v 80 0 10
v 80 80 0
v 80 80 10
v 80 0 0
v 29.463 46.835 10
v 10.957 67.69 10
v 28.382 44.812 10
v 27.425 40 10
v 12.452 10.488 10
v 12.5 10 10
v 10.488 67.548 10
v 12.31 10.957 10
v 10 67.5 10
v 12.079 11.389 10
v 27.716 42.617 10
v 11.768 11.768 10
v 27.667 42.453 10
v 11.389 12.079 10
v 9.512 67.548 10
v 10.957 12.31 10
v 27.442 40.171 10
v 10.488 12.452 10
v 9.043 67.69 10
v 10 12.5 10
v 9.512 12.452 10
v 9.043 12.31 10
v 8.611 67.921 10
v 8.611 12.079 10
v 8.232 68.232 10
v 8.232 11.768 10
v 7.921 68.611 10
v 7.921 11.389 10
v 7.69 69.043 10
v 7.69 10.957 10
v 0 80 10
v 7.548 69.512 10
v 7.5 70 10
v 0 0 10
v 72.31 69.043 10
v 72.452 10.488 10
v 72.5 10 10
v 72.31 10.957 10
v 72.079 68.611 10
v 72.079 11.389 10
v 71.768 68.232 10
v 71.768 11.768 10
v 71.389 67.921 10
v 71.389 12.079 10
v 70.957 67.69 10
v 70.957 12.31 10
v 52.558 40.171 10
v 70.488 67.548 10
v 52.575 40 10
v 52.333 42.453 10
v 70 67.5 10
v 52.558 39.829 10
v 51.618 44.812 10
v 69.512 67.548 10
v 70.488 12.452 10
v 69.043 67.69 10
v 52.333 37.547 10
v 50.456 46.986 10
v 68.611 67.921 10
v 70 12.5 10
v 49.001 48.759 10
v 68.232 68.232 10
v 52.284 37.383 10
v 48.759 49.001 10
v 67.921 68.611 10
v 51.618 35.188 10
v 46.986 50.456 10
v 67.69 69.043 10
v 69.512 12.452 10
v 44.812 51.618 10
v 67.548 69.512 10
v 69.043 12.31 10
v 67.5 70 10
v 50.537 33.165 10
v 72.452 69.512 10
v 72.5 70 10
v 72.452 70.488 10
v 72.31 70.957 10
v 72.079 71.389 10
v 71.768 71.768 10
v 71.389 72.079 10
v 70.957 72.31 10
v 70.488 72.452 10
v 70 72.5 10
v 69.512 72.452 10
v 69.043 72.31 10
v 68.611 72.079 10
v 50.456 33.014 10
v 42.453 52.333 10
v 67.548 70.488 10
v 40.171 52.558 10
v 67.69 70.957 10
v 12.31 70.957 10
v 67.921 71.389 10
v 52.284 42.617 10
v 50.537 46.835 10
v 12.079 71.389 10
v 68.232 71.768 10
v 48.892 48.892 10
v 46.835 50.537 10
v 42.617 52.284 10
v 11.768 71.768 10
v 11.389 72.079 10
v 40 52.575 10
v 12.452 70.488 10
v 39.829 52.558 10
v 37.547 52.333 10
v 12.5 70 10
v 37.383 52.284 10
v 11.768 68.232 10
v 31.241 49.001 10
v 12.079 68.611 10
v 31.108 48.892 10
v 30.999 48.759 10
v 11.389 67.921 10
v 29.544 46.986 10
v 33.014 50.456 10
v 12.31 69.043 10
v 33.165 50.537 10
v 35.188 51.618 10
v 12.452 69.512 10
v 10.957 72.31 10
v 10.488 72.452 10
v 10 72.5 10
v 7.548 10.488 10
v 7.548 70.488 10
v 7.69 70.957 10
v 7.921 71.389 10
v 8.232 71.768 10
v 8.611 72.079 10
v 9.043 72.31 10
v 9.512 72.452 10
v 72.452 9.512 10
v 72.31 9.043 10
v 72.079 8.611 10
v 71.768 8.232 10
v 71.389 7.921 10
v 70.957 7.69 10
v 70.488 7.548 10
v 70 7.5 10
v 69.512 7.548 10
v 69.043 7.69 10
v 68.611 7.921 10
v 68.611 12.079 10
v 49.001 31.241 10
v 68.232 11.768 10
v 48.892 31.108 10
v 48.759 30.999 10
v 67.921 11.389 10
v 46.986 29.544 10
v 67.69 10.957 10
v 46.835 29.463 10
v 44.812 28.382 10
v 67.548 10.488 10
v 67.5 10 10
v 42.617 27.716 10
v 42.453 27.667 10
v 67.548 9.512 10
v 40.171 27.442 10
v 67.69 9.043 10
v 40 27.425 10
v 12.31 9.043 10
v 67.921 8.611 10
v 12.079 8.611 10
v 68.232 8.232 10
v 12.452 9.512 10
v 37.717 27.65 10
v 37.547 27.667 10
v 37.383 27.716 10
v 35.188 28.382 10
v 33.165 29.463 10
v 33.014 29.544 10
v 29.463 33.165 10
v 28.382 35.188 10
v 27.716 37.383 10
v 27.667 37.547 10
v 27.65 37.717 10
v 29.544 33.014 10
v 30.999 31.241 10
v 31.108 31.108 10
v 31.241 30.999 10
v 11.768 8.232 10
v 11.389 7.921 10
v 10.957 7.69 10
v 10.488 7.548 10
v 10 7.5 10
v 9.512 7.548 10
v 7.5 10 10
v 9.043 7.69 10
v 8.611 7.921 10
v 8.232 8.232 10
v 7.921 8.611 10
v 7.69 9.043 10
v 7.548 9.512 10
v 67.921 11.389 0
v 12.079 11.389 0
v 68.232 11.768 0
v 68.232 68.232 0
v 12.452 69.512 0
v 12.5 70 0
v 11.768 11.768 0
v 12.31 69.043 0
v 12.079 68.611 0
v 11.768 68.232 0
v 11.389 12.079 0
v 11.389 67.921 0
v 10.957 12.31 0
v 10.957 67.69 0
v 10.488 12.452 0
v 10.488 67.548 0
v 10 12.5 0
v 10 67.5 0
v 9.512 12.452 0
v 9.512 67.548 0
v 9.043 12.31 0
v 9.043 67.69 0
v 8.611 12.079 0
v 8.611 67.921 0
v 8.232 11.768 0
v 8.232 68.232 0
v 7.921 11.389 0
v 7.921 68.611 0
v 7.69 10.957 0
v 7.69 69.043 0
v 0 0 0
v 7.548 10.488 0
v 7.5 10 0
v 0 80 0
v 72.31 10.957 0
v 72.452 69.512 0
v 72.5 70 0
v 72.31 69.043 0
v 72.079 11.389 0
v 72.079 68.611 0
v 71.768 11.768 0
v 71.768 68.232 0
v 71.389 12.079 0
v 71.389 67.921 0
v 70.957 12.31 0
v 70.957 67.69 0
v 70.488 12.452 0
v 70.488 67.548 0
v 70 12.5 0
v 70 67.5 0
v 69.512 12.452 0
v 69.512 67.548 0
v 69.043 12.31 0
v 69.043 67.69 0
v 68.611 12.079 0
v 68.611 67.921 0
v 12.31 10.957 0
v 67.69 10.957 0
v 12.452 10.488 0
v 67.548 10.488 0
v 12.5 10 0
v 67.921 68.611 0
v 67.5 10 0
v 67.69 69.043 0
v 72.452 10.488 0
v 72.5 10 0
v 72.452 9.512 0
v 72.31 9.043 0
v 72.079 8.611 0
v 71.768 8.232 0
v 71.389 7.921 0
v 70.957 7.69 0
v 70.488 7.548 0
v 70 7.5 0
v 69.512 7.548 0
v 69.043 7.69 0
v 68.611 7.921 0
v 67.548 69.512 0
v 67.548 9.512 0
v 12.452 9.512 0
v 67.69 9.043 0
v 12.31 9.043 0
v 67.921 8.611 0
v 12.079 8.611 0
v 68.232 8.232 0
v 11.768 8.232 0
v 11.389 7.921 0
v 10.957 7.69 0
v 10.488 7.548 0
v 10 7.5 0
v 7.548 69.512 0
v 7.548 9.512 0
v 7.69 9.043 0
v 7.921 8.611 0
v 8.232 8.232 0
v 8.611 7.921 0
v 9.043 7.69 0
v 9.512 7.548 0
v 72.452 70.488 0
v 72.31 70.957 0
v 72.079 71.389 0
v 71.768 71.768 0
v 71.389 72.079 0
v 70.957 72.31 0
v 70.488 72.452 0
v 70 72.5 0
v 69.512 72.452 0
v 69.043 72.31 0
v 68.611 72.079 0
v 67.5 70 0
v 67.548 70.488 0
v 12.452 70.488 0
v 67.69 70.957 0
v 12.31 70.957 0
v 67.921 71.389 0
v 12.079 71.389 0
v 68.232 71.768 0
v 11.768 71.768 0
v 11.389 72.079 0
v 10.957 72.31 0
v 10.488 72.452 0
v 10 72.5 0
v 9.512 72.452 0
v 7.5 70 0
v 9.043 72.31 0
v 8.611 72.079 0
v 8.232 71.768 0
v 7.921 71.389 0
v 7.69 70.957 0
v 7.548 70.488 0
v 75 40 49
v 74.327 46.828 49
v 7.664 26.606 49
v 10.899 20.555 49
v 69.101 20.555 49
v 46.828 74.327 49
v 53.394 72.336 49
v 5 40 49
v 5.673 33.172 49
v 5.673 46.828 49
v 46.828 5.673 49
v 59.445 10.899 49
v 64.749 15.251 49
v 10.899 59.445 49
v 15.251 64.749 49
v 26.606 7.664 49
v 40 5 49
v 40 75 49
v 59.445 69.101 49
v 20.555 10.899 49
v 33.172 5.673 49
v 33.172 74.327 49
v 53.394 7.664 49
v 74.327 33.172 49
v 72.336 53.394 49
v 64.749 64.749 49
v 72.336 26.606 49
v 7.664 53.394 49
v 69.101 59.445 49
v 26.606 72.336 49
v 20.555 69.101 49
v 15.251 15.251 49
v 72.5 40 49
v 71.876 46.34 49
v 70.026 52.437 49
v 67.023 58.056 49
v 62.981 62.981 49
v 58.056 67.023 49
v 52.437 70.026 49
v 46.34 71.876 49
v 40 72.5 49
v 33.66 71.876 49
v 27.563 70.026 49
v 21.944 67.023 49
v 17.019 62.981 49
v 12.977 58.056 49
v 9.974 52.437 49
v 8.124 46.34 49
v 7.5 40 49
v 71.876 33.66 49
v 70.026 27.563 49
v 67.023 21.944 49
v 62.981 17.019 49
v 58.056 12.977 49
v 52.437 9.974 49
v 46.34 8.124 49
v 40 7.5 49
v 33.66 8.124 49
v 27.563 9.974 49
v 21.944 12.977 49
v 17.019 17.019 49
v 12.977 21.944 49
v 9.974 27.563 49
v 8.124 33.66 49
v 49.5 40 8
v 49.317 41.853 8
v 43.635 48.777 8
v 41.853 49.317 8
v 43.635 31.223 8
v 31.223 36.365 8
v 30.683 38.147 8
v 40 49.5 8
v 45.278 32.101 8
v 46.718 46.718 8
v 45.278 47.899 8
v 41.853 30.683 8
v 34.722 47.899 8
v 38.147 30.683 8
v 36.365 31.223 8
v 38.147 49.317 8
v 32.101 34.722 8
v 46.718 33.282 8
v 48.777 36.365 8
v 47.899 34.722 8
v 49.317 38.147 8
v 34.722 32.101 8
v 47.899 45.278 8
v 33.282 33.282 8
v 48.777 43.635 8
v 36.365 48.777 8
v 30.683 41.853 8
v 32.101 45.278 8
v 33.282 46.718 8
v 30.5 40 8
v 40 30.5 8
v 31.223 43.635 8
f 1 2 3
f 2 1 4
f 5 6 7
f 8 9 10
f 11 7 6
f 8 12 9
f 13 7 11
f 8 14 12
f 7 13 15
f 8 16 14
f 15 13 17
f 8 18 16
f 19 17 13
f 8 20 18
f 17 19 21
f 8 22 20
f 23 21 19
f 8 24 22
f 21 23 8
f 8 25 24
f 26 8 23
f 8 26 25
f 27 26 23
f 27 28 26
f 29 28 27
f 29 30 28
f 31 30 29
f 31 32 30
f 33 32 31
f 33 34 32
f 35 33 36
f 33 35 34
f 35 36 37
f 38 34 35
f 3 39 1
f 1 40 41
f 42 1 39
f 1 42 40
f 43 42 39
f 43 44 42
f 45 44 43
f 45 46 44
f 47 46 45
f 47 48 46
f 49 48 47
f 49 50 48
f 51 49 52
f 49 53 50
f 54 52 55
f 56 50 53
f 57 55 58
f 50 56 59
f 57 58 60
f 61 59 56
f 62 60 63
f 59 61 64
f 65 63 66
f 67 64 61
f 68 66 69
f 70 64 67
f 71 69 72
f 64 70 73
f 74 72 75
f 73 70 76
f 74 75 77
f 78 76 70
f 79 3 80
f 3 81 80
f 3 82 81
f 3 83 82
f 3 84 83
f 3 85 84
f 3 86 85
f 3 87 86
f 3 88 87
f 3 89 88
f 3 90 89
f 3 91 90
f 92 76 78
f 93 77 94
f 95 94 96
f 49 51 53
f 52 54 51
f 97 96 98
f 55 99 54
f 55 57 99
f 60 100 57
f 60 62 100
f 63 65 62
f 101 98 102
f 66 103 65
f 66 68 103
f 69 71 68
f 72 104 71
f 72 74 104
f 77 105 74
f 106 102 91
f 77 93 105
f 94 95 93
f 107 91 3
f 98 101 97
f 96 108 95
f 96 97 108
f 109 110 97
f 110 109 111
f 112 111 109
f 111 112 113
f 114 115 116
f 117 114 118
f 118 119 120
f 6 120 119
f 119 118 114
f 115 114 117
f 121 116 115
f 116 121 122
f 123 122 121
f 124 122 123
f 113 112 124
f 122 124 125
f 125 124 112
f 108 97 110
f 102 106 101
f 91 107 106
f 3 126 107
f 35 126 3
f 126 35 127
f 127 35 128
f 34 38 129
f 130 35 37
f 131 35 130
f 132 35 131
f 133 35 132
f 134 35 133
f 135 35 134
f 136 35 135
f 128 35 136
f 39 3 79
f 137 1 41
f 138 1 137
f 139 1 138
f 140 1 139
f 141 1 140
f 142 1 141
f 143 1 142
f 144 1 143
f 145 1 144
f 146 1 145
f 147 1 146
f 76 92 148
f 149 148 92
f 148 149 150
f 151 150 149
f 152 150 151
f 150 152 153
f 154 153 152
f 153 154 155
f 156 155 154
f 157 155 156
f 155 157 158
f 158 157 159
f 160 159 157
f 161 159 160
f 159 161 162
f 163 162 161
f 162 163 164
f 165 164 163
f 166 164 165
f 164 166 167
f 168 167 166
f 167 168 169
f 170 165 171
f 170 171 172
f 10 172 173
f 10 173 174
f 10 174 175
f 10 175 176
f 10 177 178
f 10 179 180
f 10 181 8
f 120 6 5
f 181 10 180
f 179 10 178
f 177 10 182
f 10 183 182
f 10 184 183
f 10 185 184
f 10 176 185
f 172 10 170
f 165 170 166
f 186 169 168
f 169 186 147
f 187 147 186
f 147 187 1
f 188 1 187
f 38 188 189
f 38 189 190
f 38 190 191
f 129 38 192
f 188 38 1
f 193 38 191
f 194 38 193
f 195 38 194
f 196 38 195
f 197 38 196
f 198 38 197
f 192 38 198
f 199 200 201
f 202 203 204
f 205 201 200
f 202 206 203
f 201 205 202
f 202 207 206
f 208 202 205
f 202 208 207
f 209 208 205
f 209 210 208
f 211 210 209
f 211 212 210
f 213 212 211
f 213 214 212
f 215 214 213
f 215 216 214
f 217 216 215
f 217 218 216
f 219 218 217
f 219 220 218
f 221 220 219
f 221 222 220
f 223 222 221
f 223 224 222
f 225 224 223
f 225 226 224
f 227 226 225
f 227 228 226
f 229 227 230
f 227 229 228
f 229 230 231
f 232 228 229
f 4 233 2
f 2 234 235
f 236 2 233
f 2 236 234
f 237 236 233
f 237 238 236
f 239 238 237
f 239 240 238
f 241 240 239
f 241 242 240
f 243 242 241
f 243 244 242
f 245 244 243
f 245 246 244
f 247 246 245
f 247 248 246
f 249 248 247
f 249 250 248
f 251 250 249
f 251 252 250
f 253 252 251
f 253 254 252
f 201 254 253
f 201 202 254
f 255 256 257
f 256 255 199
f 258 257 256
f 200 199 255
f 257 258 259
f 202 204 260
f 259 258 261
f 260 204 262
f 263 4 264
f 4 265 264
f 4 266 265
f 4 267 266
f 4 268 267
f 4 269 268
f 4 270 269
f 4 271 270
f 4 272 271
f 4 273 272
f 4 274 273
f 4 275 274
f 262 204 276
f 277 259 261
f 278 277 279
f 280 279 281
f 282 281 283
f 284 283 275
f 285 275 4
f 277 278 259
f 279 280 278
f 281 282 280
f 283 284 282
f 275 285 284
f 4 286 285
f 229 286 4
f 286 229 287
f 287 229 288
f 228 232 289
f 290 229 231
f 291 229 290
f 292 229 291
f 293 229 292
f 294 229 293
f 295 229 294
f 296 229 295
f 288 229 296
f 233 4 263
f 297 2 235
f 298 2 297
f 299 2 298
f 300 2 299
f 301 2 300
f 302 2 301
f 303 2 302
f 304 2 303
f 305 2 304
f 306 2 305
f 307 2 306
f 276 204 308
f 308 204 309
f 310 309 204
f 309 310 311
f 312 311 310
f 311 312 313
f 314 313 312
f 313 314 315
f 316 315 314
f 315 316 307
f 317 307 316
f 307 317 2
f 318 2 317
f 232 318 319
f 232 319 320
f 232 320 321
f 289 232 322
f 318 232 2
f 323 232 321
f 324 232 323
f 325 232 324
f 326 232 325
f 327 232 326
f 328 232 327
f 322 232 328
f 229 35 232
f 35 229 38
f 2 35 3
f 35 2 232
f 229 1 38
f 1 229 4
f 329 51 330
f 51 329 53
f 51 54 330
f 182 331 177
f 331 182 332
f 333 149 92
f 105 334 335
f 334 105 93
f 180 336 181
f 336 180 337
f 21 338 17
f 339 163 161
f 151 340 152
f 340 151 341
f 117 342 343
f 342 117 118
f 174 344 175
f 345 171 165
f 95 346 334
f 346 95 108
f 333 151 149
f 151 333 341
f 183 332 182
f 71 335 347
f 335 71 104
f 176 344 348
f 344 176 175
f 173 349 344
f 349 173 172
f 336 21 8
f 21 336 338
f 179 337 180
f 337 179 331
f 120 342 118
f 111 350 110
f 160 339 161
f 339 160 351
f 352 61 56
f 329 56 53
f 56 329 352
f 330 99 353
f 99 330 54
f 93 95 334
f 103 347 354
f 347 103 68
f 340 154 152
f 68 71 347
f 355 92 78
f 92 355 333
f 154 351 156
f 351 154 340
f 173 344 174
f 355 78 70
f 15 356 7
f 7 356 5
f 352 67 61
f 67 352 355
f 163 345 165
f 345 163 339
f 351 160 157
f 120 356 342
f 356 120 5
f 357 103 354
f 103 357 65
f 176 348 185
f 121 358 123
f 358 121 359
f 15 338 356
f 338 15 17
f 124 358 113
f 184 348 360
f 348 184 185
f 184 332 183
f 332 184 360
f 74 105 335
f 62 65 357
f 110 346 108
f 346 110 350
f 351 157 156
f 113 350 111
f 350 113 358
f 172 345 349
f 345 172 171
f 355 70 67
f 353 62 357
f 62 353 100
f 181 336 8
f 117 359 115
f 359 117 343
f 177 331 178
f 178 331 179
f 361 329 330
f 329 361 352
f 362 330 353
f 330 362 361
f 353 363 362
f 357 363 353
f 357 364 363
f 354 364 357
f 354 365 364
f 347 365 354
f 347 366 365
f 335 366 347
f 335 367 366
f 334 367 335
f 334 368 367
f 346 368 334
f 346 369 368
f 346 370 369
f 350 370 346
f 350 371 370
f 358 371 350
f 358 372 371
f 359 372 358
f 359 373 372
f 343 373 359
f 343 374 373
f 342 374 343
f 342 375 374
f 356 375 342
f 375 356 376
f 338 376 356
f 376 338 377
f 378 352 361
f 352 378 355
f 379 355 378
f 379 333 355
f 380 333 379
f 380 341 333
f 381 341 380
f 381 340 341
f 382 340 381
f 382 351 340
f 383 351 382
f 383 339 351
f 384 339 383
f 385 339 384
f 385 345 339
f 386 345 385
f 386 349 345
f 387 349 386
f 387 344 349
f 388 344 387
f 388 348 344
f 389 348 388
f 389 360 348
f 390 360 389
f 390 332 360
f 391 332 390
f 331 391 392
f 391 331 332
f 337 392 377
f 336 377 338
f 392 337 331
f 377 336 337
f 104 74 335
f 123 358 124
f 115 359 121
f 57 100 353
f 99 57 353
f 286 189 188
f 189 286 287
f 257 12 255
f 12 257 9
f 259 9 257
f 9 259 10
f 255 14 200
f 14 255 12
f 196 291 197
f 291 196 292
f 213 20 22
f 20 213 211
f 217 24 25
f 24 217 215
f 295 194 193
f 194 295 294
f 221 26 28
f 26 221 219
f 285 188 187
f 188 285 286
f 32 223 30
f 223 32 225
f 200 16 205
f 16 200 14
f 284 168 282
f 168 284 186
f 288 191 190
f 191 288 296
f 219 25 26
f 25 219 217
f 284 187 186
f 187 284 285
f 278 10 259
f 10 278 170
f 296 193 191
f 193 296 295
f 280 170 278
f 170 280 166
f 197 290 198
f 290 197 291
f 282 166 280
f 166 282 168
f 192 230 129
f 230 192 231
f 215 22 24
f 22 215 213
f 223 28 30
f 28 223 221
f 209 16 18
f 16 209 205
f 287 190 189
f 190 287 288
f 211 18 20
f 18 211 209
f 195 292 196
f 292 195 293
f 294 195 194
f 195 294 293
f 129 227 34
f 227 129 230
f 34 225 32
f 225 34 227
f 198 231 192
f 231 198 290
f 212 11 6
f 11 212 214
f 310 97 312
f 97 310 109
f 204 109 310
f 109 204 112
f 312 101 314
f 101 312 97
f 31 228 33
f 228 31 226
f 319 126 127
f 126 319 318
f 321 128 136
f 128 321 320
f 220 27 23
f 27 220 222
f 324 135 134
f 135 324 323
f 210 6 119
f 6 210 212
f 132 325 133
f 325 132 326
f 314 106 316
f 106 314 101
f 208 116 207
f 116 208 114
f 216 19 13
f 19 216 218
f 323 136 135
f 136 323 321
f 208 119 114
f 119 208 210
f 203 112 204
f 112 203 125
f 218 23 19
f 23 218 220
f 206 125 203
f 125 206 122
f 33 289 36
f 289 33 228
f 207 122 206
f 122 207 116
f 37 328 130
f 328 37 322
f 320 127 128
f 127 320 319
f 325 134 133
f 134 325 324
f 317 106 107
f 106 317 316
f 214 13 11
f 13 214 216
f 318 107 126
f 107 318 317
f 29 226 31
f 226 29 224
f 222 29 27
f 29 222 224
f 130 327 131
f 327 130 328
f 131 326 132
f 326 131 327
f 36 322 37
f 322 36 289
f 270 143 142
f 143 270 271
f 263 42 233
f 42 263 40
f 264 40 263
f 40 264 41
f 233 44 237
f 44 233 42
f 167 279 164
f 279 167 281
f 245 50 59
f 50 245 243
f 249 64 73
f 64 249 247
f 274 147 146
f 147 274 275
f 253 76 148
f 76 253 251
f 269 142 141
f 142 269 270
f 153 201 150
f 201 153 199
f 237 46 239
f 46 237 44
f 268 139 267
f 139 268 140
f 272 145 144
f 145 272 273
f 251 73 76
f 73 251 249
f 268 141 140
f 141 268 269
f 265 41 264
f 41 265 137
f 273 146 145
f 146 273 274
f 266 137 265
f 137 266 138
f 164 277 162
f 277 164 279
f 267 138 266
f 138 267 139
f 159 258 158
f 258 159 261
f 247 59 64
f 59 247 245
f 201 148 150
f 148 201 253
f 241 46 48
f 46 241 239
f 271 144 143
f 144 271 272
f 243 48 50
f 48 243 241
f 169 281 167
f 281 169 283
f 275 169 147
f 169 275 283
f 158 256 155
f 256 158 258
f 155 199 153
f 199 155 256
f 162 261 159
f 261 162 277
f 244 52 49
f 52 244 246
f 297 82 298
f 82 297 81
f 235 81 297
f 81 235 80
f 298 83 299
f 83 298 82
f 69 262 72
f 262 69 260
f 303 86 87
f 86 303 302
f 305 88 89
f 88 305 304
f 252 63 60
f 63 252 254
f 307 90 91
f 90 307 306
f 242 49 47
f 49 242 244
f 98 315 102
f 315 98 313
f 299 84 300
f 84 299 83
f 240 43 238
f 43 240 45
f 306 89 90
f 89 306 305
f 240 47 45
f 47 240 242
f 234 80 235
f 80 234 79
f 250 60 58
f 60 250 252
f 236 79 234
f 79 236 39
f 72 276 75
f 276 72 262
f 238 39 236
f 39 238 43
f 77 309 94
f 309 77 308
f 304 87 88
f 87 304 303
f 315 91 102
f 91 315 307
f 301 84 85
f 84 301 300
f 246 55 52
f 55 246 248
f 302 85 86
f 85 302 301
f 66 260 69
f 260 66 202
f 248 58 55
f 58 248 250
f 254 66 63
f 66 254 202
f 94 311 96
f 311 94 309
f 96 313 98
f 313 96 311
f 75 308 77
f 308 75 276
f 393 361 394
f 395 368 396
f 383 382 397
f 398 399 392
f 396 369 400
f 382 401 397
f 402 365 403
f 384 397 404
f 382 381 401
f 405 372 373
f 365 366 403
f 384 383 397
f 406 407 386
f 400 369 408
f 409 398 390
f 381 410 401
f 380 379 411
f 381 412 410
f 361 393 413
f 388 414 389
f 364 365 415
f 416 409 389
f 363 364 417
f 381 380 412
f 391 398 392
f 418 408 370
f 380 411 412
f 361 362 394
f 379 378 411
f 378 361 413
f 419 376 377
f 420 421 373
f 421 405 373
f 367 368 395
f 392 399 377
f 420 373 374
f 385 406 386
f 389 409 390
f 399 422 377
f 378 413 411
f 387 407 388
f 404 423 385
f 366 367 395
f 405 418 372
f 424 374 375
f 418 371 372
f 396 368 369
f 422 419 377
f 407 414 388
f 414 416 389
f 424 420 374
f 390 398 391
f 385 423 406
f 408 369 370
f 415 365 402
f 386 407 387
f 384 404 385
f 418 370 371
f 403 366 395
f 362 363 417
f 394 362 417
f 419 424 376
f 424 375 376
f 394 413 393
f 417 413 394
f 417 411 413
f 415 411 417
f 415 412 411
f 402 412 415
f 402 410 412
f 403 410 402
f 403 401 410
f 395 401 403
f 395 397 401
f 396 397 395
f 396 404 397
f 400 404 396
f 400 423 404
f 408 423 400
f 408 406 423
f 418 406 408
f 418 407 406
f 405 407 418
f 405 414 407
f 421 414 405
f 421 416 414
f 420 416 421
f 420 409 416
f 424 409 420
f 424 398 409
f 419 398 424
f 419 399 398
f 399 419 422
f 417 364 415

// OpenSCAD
$fn = 32;

// ----------------------------------------------------------------------
// Hopper: flanged with square flange
// ----------------------------------------------------------------------

// --- parameters (mm) ---
fl = 80;                  // flange side, X and Y
fl_t = 10;                // flange thickness
cone_h = 40;              // cone height above the flange
top_d = 70;               // cone mouth diameter
bot_d = 24;               // cone spout diameter
wall = 2.5;               // cone wall thickness
hole_r = 2.5;             // flange hole radius
hole_in = 10;             // hole inset from the corners

bore_d = bot_d - 2 * wall;  // spout bore diameter
total_h = fl_t + cone_h - 1;  // overall height

difference() {
  union() {
    cube([fl, fl, fl_t]);
    translate([fl / 2, fl / 2, fl_t - 1])
      cylinder(h = cone_h, d1 = bot_d, d2 = top_d);
  }
  translate([fl / 2, fl / 2, fl_t - 2])
    cylinder(h = cone_h + 1, d1 = bore_d, d2 = top_d - 2 * wall);
  for (sx = [0, 1], sy = [0, 1])
    translate([sx ? fl - hole_in : hole_in,
               sy ? fl - hole_in : hole_in, -1])
      cylinder(r = hole_r, h = fl_t + 2);
}
